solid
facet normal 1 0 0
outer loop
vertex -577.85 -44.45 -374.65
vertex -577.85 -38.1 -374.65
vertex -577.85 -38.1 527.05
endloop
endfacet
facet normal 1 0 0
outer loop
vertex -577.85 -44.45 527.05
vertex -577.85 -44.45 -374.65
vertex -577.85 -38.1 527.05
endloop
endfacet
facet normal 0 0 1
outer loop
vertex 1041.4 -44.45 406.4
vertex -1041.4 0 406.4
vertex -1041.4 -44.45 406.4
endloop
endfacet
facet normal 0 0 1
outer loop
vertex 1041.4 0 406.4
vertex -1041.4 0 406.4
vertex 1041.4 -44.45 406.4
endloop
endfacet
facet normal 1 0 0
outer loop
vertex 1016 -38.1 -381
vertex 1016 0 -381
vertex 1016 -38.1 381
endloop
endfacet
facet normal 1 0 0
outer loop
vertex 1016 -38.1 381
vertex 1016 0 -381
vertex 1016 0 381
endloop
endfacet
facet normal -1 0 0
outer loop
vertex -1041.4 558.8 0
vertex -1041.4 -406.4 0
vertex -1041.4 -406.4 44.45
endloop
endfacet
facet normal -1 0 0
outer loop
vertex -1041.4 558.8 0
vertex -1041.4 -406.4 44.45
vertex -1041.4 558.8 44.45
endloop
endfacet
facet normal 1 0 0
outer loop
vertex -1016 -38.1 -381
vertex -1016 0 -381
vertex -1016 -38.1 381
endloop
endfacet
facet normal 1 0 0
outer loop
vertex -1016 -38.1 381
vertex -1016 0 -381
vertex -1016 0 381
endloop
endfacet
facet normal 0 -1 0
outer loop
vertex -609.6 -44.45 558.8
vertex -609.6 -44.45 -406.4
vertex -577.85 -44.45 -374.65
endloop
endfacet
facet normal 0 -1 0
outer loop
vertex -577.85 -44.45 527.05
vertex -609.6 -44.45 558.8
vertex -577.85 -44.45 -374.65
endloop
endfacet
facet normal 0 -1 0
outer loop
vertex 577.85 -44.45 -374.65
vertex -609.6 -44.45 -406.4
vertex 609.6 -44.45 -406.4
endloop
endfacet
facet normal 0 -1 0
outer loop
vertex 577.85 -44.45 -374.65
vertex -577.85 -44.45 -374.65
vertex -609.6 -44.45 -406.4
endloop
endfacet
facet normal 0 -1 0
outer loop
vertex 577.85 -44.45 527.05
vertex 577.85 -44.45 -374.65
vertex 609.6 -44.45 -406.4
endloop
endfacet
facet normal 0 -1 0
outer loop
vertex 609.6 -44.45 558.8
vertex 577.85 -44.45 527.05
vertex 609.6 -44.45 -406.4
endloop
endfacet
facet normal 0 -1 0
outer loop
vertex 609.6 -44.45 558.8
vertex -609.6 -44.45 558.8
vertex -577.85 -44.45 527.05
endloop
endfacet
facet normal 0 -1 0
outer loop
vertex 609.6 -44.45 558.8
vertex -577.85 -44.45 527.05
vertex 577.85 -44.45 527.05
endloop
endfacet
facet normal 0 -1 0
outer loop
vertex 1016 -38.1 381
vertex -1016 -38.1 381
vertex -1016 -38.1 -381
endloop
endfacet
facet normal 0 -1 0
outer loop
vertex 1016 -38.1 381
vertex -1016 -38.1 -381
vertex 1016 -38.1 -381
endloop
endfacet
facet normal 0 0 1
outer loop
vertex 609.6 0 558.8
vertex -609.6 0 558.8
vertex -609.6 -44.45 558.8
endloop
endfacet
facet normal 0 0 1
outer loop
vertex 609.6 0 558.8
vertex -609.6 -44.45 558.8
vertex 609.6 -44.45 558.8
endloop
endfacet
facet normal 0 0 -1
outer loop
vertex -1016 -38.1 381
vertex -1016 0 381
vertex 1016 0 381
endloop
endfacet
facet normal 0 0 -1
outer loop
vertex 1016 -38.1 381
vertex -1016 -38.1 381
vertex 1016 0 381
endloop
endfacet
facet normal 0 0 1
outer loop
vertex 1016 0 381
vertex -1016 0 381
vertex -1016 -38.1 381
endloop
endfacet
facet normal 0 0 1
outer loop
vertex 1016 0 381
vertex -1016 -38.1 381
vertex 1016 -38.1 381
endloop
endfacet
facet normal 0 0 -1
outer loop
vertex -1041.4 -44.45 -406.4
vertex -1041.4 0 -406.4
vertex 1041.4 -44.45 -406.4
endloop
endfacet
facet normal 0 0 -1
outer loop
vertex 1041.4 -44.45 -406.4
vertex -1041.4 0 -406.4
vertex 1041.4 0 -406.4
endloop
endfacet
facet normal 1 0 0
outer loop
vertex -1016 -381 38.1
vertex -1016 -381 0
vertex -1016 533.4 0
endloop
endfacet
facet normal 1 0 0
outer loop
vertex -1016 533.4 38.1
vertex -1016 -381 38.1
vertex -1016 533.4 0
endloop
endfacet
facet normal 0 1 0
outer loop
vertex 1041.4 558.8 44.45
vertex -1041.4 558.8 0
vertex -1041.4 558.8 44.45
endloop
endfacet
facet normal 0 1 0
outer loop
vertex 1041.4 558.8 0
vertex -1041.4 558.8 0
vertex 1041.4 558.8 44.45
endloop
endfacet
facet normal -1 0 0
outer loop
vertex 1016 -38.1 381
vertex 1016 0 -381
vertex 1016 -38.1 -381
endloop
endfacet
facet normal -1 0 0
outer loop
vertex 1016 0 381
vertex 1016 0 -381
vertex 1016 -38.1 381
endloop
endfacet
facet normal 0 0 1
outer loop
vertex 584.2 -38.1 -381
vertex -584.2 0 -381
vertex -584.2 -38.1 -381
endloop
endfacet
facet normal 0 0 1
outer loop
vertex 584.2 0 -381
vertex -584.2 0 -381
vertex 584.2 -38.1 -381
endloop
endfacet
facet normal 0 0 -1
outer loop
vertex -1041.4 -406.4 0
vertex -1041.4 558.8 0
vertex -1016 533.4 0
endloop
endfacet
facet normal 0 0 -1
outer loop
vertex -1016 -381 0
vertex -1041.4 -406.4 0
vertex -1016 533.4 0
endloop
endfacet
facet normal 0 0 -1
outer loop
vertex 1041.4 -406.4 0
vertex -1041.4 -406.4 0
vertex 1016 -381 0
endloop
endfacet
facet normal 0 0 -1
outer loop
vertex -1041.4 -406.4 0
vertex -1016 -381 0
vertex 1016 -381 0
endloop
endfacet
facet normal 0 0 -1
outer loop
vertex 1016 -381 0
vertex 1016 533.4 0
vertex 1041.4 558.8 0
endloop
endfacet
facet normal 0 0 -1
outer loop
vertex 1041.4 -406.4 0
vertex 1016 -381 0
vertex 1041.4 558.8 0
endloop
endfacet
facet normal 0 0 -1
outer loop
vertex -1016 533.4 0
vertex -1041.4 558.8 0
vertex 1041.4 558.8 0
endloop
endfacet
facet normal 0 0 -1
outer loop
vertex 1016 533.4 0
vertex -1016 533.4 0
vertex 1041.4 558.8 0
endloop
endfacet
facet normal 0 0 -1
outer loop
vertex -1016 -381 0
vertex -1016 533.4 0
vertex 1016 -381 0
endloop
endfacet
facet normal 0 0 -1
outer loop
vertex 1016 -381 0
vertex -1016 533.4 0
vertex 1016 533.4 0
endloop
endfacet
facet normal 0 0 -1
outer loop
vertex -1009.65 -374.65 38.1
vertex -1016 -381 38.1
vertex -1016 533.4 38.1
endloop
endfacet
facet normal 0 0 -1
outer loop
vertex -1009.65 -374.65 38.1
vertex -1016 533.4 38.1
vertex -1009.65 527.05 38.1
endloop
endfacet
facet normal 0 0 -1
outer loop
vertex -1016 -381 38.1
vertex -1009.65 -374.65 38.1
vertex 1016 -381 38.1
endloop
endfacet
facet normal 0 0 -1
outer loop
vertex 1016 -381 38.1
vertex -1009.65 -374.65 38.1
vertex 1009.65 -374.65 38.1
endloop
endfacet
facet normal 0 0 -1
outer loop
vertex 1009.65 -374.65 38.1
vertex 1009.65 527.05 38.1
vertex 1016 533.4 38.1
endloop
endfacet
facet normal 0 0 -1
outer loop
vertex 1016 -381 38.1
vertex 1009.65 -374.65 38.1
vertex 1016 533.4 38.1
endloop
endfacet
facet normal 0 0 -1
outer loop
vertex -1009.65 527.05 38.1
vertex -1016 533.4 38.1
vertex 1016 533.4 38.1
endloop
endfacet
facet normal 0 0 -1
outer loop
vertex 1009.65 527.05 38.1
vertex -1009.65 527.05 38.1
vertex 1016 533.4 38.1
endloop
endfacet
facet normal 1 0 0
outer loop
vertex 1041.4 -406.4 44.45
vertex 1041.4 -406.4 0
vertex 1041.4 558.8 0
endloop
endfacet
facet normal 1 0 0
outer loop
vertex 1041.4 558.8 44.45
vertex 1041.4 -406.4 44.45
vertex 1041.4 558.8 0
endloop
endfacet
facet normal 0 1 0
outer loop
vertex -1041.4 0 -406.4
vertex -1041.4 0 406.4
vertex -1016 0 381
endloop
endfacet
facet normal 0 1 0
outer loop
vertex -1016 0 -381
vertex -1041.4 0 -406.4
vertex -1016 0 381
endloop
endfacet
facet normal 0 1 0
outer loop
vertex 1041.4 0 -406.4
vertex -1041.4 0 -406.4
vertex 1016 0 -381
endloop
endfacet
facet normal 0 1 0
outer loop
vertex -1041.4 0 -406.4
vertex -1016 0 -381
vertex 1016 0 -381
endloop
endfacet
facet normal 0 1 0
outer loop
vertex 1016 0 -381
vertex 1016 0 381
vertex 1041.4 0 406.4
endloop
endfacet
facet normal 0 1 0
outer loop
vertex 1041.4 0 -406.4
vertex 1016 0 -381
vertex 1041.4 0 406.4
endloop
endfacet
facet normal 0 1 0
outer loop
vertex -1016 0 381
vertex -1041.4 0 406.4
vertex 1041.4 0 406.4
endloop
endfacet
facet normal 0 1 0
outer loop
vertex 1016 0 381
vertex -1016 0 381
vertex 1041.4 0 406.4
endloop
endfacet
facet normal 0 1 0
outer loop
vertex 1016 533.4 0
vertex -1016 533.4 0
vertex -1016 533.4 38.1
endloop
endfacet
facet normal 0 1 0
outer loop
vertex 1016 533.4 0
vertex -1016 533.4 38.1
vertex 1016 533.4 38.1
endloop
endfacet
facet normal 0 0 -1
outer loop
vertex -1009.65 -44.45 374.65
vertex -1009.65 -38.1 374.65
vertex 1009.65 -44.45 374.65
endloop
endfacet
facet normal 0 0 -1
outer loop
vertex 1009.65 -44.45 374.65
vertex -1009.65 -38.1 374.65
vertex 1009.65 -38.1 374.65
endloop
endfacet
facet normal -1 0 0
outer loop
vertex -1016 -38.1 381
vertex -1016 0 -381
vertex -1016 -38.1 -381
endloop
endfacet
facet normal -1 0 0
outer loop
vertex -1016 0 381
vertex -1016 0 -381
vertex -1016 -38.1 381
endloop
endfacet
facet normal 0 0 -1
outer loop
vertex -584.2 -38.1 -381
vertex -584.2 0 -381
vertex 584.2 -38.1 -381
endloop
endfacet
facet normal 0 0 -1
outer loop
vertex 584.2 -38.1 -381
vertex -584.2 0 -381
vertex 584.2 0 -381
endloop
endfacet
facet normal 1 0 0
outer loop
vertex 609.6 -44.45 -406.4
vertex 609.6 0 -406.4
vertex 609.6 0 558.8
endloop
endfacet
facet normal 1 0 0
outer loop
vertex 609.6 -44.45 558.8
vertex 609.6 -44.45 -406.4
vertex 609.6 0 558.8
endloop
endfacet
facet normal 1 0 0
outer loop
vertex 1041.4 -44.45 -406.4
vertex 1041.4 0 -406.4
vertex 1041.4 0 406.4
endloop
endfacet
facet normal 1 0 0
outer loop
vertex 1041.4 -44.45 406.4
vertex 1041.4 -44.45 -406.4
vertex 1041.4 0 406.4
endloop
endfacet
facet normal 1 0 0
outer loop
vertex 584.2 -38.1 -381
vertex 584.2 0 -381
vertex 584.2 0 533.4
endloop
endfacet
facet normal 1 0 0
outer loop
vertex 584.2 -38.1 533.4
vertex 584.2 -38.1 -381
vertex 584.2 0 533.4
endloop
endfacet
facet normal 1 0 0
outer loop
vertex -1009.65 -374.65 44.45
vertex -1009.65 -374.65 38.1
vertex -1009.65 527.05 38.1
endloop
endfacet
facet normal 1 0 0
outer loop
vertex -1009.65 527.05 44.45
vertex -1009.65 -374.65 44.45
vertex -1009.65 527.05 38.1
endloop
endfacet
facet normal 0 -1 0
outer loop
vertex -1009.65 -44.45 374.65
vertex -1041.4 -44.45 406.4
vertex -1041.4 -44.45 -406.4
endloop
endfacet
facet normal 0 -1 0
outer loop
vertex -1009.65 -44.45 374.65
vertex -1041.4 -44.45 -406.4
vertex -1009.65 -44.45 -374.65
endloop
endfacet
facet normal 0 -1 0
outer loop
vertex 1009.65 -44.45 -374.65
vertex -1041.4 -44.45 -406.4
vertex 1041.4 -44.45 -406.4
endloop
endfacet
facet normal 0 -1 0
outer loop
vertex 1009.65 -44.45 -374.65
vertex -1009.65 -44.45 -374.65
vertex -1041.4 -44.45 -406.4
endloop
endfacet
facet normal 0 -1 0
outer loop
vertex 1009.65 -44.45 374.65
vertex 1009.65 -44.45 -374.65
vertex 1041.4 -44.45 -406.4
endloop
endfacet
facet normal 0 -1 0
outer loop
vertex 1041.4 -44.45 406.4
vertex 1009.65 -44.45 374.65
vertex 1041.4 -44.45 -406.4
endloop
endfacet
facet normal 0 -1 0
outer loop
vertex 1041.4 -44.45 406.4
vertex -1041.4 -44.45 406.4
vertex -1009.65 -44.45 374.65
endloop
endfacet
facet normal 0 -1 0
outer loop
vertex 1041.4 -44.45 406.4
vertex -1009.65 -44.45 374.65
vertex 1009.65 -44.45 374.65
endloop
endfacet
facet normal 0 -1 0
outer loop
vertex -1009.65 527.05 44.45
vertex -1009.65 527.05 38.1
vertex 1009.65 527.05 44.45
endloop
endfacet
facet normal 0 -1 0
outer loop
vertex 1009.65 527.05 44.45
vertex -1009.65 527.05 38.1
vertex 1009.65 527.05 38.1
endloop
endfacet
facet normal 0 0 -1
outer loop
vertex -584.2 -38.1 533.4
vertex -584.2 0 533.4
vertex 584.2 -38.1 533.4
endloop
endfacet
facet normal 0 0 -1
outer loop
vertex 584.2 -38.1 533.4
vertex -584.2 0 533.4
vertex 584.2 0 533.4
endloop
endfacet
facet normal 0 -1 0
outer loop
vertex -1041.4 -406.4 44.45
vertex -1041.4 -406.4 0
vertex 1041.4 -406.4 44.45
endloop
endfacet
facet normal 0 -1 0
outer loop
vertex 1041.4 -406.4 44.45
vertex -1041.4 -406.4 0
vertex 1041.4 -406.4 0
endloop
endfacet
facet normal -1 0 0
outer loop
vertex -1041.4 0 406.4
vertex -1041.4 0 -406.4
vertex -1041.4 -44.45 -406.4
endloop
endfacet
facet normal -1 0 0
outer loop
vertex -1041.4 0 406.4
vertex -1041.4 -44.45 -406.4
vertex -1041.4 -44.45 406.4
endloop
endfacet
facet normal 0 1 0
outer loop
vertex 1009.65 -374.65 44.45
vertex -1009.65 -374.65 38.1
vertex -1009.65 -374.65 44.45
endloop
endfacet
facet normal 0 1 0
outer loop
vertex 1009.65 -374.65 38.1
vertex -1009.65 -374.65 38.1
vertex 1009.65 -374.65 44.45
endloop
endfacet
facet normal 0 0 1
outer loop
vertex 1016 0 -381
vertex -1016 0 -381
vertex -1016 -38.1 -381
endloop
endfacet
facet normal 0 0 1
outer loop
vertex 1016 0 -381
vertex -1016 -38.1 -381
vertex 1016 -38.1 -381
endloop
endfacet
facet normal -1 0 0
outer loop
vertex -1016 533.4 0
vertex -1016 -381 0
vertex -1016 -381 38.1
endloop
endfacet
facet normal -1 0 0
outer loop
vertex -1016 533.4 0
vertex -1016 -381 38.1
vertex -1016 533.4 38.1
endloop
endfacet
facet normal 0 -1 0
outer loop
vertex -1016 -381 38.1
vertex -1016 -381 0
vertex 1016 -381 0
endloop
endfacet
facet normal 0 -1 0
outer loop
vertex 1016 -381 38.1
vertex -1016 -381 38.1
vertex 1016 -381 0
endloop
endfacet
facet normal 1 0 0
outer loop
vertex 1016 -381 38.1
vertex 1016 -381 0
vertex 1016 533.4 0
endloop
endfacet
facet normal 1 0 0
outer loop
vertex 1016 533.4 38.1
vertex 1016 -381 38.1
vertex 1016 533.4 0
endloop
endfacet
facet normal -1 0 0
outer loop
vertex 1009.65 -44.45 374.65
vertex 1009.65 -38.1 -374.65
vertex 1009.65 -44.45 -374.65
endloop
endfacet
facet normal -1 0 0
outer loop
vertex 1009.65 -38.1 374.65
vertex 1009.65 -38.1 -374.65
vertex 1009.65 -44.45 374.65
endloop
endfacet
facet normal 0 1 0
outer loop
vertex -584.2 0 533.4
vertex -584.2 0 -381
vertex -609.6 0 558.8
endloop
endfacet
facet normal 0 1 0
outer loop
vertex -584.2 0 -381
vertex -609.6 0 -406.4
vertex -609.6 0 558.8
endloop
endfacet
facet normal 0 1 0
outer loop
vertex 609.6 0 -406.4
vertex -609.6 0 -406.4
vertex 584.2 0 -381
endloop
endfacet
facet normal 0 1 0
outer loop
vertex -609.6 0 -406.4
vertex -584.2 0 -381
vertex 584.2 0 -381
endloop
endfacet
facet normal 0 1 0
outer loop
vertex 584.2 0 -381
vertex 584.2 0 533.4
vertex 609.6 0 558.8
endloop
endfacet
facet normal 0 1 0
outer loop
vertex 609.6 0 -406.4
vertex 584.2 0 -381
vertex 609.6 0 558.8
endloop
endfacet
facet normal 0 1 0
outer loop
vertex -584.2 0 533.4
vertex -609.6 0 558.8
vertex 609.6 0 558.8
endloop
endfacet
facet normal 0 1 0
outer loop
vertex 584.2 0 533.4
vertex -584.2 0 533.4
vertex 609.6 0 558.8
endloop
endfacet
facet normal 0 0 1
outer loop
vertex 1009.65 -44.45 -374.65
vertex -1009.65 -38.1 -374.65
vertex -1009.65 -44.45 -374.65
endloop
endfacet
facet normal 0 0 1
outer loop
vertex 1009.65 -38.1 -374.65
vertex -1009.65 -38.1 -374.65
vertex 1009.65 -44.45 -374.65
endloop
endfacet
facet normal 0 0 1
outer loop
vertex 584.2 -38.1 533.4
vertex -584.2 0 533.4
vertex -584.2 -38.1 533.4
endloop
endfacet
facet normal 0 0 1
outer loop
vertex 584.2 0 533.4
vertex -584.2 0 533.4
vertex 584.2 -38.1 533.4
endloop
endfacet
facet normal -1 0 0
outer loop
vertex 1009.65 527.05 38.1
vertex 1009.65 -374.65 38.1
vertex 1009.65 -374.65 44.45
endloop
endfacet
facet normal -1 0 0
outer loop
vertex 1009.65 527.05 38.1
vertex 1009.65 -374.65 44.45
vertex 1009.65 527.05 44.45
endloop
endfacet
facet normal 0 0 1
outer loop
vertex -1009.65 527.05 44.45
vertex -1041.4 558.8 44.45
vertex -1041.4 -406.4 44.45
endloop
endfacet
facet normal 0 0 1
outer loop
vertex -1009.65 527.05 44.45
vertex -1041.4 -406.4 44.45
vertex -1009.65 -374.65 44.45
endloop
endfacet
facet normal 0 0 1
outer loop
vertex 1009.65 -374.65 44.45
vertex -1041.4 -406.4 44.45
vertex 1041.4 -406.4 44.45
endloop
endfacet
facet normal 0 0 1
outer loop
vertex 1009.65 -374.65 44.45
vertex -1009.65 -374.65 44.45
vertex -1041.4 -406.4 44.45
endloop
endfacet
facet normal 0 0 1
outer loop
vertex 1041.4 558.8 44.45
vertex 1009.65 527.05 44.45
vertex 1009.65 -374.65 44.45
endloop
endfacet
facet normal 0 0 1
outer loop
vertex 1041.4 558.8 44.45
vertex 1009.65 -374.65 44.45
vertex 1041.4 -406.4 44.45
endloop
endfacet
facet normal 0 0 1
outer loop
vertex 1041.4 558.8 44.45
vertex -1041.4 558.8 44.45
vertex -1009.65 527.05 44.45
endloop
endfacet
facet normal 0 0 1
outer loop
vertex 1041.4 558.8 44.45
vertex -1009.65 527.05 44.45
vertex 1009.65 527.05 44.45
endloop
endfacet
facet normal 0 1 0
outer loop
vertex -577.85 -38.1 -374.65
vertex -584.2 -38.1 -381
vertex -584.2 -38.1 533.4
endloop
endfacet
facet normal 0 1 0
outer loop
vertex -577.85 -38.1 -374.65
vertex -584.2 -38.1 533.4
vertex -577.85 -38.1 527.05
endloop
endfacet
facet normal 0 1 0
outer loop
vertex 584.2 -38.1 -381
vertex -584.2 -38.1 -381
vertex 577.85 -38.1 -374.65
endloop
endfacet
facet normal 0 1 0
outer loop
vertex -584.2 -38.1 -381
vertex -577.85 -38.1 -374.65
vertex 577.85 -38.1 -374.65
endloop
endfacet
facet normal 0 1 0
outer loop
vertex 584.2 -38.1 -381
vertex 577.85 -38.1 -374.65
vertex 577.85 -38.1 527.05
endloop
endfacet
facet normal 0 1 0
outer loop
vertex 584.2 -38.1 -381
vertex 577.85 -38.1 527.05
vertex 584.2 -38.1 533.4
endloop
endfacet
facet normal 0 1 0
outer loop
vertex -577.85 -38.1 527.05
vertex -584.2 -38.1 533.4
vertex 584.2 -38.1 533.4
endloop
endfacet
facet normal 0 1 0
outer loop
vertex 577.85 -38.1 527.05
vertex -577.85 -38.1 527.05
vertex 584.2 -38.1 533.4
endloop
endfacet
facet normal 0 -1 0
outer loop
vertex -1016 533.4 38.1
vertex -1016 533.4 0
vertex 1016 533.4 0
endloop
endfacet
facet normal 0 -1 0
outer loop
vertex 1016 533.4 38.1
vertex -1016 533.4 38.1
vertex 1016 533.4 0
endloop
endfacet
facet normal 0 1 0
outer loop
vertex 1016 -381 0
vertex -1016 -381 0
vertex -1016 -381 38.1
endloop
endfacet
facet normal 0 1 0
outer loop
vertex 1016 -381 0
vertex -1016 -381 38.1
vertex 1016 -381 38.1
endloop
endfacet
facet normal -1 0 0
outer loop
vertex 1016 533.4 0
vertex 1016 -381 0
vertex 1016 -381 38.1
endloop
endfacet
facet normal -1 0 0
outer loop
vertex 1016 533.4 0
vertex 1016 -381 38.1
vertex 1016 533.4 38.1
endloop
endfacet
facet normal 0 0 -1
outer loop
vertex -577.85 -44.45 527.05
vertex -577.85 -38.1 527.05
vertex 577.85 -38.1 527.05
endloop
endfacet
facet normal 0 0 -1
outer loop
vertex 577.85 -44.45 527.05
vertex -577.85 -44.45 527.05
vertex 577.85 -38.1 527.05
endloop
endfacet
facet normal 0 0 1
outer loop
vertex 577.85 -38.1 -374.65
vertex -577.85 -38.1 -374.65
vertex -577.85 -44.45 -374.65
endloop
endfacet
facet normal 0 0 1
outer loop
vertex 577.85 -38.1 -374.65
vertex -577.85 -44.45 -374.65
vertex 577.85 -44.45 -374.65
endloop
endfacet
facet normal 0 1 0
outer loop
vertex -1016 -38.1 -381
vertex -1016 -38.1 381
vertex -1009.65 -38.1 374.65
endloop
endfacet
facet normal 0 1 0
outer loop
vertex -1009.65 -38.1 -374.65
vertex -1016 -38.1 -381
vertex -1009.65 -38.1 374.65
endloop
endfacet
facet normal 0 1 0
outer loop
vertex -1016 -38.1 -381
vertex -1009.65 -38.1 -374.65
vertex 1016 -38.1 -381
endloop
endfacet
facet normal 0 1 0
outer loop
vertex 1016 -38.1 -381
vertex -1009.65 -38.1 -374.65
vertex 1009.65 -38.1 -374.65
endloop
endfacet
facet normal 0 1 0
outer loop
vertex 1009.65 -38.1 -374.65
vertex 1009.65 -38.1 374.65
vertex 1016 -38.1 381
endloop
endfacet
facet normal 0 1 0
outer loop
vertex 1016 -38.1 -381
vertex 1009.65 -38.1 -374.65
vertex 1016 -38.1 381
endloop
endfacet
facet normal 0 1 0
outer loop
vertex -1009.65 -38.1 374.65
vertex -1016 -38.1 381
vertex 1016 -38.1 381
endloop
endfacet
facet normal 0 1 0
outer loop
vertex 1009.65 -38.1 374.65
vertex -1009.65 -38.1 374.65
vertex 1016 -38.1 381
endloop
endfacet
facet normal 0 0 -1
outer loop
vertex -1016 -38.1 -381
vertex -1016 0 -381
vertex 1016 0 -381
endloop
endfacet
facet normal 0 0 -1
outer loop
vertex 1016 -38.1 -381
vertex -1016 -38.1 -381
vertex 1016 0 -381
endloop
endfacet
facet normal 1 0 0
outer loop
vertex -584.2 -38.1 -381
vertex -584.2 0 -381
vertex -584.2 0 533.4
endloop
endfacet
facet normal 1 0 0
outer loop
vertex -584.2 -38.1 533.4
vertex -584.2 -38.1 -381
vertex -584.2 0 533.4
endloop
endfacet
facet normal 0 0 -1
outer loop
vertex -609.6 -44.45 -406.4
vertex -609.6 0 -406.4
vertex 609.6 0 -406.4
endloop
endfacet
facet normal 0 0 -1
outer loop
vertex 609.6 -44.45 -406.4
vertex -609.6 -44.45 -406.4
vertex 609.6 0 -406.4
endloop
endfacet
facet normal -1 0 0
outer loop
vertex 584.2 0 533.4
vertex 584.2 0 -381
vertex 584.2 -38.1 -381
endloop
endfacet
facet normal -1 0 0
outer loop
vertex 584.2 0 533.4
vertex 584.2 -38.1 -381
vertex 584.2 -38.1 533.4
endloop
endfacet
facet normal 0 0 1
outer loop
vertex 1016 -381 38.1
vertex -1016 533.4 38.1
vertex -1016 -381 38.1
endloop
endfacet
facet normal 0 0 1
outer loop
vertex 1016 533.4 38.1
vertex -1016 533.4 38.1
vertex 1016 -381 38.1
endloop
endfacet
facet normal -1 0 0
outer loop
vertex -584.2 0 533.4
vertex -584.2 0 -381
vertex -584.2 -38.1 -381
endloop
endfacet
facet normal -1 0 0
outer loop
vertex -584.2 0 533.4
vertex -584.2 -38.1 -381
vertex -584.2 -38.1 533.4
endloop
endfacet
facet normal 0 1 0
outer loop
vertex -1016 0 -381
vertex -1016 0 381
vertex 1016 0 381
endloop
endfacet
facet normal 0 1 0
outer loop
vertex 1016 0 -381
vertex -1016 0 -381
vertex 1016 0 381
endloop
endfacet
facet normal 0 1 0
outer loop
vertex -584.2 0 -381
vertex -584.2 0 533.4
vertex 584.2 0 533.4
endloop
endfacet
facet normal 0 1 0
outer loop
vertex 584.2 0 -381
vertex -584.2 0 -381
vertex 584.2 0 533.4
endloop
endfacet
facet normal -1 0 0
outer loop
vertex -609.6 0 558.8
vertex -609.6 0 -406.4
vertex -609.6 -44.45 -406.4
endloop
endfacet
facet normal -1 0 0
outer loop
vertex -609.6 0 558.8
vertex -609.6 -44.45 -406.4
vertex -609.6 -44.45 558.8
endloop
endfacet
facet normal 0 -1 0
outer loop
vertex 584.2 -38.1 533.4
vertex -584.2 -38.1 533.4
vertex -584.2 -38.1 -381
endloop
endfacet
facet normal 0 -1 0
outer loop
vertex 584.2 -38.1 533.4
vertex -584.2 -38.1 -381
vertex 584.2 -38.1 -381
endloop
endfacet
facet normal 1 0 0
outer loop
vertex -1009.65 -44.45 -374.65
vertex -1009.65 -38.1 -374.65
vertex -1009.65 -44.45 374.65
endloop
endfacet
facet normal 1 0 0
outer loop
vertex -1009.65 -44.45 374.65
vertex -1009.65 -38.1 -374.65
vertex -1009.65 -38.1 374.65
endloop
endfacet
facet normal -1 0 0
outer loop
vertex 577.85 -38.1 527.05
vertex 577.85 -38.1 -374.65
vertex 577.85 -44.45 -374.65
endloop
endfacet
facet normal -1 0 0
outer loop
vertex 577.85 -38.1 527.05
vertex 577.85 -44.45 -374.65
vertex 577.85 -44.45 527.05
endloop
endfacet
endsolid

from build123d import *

# Parameters (mm, degrees)
F0_W      = 2082.8
F0_H      = 812.8
F0_W_2    = 2032
F0_H_2    = 762
F1_DEPTH  = 44.45
F0_W_3    = 2019.3
F0_H_3    = 749.3
F2_DEPTH  = 38.1
F3_START  = 38.1
F3_DEPTH  = 6.35
F4_W      = 1168.4
F4_H      = 914.4
F4_W_2    = 1155.7
F4_H_2    = 901.7
F5_DEPTH  = 38.1
F4_W_3    = 1219.2
F4_H_3    = 965.2
F6_DEPTH  = 44.45
F7_START  = 38.1
F7_DEPTH  = 6.35
F8_W      = 2032
F8_H      = 914.4
F8_W_2    = 2019.3
F8_H_2    = 901.7
F9_DEPTH  = 38.1
F10_START = 38.1
F8_W_3    = 2082.8
F8_H_3    = 965.2
F10_DEPTH = 6.35
F11_DEPTH = 38.1


with BuildPart() as f1:
    # F0 (on Front) → F1 (new body)
    with BuildSketch(Plane.XZ):
        Rectangle(F0_W, F0_H)
        Rectangle(F0_W_2, F0_H_2, mode=Mode.SUBTRACT)
    extrude(amount=F1_DEPTH)

    # F0 (on Front) → F3 (join)
    with BuildSketch(Plane.XZ.offset(F3_START)):
        Rectangle(F0_W_2, F0_H_2)
        Rectangle(F0_W_3, F0_H_3, mode=Mode.SUBTRACT)
    extrude(amount=F3_DEPTH)


with BuildPart() as f2:
    # F0 (on Front) → F2 (new body)
    with BuildSketch(Plane.XZ):
        Rectangle(F0_W_2, F0_H_2)
        Rectangle(F0_W_3, F0_H_3, mode=Mode.SUBTRACT)
        Rectangle(F0_W_3, F0_H_3)
    extrude(amount=F2_DEPTH)


with BuildPart() as f5:
    # F4 (on Front) → F5 (new body)
    with BuildSketch(Plane.XZ):
        with Locations((0, 76.2)):
            Rectangle(F4_W, F4_H)
        with Locations((0, 76.2)):
            Rectangle(F4_W_2, F4_H_2, mode=Mode.SUBTRACT)
        with Locations((0, 76.2)):
            Rectangle(F4_W_2, F4_H_2)
    extrude(amount=F5_DEPTH)


with BuildPart() as f6:
    # F4 (on Front) → F6 (new body)
    with BuildSketch(Plane.XZ):
        with Locations((0, 76.2)):
            Rectangle(F4_W_3, F4_H_3)
        with Locations((0, 76.2)):
            Rectangle(F4_W, F4_H, mode=Mode.SUBTRACT)
    extrude(amount=F6_DEPTH)

    # F4 (on Front) → F7 (join)
    with BuildSketch(Plane.XZ.offset(F7_START)):
        with Locations((0, 76.2)):
            Rectangle(F4_W_3, F4_H_3)
        with Locations((0, 76.2)):
            Rectangle(F4_W, F4_H, mode=Mode.SUBTRACT)
        with Locations((0, 76.2)):
            Rectangle(F4_W, F4_H)
        with Locations((0, 76.2)):
            Rectangle(F4_W_2, F4_H_2, mode=Mode.SUBTRACT)
    extrude(amount=F7_DEPTH)


with BuildPart() as f9:
    # F8 (on Top) → F9 (new body)
    with BuildSketch(Plane.XY):
        with Locations((0, 76.2)):
            Rectangle(F8_W, F8_H)
        with Locations((0, 76.2)):
            Rectangle(F8_W_2, F8_H_2, mode=Mode.SUBTRACT)
        with Locations((0, 76.2)):
            Rectangle(F8_W_2, F8_H_2)
    extrude(amount=F9_DEPTH)


with BuildPart() as f10:
    # F8 (on Top) → F10 (new body)
    with BuildSketch(Plane.XY.offset(F10_START)):
        with Locations((0, 76.2)):
            Rectangle(F8_W_3, F8_H_3)
        with Locations((0, 76.2)):
            Rectangle(F8_W, F8_H, mode=Mode.SUBTRACT)
        with Locations((0, 76.2)):
            Rectangle(F8_W, F8_H)
        with Locations((0, 76.2)):
            Rectangle(F8_W_2, F8_H_2, mode=Mode.SUBTRACT)
    extrude(amount=F10_DEPTH)

    # F8 (on Top) → F11 (join)
    with BuildSketch(Plane.XY):
        with Locations((0, 76.2)):
            Rectangle(F8_W_3, F8_H_3)
        with Locations((0, 76.2)):
            Rectangle(F8_W, F8_H, mode=Mode.SUBTRACT)
    extrude(amount=F11_DEPTH)


solid = Compound([f1.part, f2.part, f5.part, f6.part, f9.part, f10.part])
